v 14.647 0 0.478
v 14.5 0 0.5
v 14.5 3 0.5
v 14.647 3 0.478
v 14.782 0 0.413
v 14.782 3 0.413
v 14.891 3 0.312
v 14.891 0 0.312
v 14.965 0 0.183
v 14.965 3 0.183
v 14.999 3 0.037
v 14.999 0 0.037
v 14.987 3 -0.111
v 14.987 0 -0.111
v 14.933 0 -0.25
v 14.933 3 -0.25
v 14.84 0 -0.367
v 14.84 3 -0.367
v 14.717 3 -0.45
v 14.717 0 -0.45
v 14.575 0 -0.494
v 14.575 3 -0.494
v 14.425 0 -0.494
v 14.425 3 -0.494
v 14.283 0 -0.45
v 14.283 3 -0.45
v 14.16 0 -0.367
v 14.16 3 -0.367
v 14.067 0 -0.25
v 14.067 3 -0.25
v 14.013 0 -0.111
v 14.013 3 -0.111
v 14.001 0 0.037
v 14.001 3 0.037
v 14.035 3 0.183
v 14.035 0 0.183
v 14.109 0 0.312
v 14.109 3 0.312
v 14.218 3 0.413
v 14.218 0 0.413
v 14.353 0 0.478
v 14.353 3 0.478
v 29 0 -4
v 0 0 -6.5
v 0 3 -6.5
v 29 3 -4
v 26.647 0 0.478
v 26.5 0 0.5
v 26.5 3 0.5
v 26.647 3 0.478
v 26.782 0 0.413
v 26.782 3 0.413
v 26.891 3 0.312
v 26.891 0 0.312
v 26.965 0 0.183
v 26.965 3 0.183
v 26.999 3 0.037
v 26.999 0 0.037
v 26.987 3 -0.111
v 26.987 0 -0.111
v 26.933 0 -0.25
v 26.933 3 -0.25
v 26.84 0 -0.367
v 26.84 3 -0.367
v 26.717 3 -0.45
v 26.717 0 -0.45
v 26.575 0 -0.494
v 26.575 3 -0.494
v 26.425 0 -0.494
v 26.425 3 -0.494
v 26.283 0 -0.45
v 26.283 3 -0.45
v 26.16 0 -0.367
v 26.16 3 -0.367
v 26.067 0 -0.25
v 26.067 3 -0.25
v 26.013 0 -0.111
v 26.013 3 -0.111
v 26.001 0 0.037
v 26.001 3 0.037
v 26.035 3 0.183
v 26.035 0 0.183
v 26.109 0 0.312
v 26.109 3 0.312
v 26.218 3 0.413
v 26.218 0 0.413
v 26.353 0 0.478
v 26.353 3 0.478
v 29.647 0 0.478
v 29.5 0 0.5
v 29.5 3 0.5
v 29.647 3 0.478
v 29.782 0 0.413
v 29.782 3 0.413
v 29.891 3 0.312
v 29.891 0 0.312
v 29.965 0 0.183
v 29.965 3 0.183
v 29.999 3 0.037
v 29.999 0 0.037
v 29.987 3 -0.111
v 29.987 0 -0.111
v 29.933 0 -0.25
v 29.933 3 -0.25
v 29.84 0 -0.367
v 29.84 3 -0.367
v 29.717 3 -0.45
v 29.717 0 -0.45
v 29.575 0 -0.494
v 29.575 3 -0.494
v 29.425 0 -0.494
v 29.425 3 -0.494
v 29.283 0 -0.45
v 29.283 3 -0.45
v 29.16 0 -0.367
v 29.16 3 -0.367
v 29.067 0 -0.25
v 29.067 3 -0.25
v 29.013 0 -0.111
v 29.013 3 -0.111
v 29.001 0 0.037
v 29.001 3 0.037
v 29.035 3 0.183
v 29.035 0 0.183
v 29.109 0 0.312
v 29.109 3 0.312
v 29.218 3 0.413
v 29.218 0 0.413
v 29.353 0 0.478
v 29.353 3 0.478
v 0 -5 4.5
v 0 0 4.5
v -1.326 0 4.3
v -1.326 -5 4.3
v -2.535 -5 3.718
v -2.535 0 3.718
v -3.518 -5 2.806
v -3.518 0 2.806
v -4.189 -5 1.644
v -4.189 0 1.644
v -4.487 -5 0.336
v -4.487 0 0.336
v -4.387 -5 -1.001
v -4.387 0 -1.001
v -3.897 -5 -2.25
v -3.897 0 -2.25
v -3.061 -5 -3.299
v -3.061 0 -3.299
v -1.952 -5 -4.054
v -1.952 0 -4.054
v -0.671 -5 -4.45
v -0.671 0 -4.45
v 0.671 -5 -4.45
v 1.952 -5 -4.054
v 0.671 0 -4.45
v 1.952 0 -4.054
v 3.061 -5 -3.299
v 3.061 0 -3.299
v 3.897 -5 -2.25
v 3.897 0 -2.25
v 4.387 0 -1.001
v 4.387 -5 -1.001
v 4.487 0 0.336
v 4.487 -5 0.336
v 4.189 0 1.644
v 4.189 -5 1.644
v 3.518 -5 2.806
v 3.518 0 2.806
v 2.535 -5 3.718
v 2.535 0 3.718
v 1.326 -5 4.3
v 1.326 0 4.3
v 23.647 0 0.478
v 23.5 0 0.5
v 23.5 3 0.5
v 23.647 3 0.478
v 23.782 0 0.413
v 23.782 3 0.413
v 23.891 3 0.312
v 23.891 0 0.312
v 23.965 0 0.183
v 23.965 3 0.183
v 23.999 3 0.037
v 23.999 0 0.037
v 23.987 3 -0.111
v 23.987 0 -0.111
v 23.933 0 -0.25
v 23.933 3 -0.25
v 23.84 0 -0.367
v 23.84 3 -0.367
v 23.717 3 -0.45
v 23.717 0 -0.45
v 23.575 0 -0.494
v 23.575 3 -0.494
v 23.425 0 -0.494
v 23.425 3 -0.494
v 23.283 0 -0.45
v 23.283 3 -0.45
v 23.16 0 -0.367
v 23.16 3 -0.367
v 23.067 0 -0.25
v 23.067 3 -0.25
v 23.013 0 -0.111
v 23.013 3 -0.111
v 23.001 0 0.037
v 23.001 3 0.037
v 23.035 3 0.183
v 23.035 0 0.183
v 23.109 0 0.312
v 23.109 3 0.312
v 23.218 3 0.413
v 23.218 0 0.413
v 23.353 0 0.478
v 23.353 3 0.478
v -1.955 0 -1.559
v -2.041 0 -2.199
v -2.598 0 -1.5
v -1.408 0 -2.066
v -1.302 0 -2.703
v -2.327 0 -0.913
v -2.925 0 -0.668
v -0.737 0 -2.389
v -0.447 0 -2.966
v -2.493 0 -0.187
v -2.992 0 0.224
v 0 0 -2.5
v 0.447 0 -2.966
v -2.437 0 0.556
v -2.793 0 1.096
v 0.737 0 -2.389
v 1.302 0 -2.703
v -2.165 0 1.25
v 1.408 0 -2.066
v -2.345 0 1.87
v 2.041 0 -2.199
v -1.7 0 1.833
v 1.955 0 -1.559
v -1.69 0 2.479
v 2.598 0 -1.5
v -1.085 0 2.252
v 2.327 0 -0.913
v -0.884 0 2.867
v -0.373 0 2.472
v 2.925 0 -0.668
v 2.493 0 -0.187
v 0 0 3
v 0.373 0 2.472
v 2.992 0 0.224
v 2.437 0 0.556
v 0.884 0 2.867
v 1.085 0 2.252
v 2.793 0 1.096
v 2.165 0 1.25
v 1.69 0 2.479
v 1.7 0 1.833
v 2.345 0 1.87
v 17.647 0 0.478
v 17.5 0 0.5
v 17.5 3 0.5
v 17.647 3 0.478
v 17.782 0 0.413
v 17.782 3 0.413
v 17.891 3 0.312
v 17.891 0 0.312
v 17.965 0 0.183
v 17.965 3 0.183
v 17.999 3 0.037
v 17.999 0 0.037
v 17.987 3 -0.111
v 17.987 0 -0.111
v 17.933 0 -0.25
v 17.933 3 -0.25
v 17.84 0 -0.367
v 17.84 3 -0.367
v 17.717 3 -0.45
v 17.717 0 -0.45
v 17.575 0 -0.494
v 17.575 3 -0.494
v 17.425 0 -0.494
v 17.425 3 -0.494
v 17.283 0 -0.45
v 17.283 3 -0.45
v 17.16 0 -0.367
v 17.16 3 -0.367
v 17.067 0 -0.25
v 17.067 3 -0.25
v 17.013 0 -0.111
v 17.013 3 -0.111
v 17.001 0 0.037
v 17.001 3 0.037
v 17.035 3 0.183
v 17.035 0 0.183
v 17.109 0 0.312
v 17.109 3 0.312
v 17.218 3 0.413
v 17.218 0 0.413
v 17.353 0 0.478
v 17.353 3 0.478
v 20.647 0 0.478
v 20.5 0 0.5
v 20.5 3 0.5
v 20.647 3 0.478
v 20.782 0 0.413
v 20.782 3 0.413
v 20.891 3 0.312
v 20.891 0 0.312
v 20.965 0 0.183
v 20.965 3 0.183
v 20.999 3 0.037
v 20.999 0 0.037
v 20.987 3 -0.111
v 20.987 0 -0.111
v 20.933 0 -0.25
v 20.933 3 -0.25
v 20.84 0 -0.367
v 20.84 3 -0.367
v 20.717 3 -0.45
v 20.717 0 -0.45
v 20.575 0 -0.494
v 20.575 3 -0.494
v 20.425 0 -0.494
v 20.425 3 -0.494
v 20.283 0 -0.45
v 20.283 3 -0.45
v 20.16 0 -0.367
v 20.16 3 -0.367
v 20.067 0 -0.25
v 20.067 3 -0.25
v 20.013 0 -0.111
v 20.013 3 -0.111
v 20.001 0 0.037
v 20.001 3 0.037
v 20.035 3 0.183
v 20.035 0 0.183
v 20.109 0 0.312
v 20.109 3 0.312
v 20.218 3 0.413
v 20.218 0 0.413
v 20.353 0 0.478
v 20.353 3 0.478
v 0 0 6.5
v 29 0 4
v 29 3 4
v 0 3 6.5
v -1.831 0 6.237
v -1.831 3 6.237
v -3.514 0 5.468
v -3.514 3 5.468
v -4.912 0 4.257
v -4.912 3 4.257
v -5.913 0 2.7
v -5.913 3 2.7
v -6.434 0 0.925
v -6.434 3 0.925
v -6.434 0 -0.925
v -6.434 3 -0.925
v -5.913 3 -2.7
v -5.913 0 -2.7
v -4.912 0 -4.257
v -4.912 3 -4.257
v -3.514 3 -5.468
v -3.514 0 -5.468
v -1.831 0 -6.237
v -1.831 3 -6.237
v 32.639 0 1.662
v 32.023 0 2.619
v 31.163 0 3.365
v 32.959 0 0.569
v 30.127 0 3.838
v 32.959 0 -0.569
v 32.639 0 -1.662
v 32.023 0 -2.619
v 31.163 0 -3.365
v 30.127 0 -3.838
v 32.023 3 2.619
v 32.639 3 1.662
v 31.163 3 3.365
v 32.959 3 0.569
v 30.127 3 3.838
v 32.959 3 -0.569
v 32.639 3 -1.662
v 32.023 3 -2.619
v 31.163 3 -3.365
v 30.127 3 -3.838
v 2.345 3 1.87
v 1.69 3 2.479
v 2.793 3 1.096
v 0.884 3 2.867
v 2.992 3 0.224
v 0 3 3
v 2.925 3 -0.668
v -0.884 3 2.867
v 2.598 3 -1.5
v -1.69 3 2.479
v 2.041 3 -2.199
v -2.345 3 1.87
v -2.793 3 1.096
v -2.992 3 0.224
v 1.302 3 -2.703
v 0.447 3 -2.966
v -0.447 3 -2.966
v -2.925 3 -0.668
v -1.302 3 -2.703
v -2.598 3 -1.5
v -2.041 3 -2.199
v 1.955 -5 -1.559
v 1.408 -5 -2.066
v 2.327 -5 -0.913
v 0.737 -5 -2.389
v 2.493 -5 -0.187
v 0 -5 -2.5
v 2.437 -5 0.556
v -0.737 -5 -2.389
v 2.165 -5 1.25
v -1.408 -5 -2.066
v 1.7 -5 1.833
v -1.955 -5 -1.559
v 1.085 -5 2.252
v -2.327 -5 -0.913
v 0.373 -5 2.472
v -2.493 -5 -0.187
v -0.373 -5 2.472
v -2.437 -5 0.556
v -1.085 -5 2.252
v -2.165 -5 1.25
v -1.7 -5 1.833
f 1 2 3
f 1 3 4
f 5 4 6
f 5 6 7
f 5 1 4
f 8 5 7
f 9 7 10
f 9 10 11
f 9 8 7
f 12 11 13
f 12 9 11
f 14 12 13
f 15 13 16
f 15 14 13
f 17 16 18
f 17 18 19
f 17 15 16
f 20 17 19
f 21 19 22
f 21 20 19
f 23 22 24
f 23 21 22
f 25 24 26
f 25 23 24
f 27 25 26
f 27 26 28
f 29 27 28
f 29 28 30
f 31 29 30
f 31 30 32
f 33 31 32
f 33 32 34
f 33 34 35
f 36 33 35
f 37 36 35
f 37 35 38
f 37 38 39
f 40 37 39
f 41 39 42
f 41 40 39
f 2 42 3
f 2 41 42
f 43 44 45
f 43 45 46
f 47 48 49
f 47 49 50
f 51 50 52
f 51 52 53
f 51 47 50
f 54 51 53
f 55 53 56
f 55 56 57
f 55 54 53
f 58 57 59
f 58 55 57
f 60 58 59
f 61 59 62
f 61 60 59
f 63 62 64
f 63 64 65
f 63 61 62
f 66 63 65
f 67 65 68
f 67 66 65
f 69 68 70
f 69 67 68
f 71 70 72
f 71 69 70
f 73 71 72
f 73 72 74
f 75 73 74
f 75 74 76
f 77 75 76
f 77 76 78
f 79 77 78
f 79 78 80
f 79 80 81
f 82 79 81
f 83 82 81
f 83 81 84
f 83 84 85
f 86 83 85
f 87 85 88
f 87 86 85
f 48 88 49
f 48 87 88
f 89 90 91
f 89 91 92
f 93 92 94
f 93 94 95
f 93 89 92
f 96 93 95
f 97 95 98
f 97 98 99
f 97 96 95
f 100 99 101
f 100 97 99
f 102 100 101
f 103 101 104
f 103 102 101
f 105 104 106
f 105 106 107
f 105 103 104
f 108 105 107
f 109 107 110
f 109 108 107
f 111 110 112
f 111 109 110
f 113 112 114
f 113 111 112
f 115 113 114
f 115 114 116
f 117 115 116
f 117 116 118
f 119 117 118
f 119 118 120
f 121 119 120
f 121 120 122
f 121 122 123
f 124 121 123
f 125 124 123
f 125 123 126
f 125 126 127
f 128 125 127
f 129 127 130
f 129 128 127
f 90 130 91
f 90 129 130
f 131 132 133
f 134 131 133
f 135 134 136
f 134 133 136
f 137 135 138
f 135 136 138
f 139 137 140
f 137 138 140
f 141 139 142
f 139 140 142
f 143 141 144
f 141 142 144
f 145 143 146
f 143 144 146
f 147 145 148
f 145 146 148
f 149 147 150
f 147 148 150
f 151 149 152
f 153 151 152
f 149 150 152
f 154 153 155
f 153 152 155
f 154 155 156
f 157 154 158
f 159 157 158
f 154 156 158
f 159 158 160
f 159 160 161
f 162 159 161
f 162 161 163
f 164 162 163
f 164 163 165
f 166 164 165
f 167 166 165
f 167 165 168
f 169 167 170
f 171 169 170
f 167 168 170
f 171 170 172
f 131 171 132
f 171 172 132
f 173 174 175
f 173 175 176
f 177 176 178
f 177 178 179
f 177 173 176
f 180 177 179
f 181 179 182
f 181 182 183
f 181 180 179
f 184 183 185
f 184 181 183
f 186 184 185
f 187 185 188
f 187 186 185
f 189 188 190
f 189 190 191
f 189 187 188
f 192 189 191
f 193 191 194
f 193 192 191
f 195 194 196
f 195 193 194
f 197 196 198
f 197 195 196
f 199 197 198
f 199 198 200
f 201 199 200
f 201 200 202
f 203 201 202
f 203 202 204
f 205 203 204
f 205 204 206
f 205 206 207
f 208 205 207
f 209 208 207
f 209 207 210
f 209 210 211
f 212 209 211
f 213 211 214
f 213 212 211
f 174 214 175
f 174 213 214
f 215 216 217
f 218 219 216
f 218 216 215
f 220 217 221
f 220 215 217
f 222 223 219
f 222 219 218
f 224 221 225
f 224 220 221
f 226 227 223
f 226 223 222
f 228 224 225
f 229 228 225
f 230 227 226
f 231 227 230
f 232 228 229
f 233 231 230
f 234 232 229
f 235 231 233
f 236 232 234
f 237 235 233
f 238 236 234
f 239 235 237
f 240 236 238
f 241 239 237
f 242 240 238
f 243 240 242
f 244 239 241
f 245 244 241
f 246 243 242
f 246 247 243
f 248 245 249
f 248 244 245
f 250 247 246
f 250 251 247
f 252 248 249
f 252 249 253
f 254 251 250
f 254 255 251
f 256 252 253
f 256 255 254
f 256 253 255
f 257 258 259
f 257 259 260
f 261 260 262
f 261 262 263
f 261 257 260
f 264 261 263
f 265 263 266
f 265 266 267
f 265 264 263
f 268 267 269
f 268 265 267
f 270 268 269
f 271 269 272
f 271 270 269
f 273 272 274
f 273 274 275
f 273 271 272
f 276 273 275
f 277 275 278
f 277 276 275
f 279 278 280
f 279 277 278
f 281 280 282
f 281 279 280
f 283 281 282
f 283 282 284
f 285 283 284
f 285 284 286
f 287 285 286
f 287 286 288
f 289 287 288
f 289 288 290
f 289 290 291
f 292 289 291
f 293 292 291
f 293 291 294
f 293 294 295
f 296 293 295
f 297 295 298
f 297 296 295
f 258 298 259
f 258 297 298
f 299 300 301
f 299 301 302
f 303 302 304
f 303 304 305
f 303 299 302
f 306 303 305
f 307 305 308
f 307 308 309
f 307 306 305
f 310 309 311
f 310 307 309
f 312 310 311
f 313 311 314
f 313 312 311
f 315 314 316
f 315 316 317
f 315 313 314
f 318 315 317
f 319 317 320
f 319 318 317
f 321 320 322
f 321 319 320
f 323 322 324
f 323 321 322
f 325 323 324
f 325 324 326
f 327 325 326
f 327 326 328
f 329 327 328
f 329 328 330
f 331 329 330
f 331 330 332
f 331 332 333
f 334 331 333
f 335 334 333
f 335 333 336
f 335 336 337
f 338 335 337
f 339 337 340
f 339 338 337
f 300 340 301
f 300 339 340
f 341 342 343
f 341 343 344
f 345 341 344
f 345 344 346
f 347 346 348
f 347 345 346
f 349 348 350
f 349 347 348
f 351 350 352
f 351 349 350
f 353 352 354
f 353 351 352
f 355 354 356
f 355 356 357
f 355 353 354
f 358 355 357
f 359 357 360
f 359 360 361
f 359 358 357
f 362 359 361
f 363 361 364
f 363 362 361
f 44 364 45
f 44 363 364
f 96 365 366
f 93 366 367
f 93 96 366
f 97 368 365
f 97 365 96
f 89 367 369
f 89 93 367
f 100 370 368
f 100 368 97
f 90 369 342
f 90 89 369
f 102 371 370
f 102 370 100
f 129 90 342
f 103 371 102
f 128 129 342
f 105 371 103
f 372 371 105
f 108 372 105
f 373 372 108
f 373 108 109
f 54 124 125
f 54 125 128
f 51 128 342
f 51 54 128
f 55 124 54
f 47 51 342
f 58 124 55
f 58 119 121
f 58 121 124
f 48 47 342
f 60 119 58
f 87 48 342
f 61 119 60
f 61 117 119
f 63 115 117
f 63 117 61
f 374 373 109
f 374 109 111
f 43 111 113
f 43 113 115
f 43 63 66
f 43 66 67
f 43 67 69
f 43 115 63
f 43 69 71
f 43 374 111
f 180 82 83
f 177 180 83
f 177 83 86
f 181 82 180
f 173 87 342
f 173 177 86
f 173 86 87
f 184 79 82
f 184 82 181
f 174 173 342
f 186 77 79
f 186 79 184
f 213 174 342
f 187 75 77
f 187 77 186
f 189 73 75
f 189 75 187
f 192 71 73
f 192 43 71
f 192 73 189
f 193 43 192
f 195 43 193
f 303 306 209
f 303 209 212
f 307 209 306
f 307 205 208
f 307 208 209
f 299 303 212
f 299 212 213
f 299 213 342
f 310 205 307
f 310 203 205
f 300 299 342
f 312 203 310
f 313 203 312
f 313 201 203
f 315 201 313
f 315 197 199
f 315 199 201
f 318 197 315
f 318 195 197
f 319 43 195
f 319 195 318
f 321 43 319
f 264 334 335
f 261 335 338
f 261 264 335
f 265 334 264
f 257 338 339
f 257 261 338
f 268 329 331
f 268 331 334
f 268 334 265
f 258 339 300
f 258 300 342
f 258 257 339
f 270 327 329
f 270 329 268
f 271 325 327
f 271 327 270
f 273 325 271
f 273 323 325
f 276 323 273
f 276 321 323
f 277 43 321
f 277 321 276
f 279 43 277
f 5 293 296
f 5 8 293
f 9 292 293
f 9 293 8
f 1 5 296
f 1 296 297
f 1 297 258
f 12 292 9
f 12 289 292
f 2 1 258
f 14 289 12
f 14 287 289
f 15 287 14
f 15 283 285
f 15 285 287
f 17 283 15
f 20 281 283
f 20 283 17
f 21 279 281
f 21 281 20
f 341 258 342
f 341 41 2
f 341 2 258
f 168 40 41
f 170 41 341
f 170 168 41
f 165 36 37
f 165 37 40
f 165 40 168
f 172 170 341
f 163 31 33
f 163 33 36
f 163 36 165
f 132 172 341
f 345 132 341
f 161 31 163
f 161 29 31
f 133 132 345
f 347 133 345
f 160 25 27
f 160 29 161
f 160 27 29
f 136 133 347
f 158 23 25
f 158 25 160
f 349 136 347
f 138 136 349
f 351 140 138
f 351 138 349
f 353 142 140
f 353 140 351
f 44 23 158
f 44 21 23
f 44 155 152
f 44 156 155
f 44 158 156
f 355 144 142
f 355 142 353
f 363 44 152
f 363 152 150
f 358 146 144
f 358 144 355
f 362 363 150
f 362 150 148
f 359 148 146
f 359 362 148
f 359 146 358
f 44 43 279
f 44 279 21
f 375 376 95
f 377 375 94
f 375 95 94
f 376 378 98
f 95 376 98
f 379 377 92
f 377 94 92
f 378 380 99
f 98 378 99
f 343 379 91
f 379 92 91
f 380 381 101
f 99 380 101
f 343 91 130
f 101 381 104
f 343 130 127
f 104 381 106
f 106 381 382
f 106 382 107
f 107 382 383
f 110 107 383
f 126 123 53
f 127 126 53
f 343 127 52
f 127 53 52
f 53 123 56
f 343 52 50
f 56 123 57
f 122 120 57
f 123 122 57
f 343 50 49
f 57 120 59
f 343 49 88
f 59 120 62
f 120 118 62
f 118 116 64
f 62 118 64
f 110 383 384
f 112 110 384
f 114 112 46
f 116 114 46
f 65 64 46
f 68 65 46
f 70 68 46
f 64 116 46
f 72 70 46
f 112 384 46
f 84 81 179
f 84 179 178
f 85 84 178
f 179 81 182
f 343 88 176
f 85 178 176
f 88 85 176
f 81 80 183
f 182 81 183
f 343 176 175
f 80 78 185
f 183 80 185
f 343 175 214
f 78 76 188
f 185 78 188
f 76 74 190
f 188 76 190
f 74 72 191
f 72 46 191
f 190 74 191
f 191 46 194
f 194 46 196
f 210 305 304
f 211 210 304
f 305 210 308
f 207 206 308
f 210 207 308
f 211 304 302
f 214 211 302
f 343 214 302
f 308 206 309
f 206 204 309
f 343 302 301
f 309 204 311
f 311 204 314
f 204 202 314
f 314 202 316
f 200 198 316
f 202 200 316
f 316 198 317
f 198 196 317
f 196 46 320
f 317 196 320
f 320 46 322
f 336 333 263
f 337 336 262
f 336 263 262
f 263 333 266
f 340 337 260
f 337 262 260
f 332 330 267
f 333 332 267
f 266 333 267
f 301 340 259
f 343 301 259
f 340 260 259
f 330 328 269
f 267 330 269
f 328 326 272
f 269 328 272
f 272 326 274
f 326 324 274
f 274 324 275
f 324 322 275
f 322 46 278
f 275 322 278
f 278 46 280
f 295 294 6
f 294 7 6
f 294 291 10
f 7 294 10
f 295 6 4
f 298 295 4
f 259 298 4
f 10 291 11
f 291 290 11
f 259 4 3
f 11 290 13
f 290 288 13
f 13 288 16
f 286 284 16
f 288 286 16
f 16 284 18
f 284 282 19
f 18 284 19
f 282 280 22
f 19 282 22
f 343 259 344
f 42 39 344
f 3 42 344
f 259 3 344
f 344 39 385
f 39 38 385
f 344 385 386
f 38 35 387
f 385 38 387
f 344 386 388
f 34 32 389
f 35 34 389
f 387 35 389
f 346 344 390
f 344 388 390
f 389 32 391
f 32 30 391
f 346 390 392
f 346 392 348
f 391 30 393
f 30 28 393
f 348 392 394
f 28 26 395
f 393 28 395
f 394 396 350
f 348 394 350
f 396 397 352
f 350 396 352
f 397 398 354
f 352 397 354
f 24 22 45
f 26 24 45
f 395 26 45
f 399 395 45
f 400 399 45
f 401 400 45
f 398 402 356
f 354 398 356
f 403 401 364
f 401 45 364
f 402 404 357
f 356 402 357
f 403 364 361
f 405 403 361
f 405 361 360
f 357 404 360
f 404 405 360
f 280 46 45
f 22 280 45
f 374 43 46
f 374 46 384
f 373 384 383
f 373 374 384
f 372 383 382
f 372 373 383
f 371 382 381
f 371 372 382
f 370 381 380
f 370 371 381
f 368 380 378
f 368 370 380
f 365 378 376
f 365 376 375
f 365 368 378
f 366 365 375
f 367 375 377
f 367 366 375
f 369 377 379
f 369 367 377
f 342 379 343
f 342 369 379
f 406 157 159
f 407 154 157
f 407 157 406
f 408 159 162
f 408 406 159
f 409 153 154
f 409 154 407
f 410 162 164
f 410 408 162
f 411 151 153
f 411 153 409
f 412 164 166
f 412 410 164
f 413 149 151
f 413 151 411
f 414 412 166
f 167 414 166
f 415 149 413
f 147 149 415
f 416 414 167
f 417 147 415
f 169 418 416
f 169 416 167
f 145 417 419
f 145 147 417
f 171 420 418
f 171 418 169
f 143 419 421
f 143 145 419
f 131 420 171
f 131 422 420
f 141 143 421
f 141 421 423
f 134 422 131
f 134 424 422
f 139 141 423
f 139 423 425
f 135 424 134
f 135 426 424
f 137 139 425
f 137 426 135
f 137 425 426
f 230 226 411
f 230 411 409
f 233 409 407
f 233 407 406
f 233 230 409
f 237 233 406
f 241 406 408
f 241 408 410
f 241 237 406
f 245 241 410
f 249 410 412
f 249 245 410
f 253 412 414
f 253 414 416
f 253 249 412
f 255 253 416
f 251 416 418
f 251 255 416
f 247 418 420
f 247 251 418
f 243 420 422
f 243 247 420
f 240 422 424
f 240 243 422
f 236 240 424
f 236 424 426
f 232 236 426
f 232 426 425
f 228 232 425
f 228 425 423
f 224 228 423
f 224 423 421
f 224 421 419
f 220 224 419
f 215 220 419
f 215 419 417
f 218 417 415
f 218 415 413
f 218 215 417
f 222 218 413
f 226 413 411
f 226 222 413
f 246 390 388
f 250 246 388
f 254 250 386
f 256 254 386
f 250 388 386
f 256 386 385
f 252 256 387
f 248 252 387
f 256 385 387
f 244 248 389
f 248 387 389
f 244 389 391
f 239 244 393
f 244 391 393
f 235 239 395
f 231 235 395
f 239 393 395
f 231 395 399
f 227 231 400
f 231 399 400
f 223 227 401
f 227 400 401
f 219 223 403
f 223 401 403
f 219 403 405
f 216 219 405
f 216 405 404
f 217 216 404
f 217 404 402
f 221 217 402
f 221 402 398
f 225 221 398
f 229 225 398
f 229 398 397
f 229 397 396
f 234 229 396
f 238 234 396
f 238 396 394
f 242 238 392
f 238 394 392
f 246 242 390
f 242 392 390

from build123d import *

# Parameters (mm, degrees)
SKETCH1_R           = 0.5
BOSS_EXTRUDE1_DEPTH = 3
SKETCH3_R           = 4.5
SKETCH3_R_2         = 2.5
BOSS_EXTRUDE2_DEPTH = 5
SKETCH4_R           = 3
CUT_EXTRUDE1_DEPTH  = 3


with BuildPart() as part:
    # Sketch1 → Boss-Extrude1 (new body)
    with BuildSketch(Plane(origin=(0, 0, 0), x_dir=(1, 0, 0), z_dir=(0, 1, 0))):
        with BuildLine():
            Line((0, 6.5), (29, 4))
            ThreePointArc((29, 4), (33, 0), (29, -4))
            Line((29, -4), (0, -6.5))
            ThreePointArc((0, -6.5), (-6.5, 0), (0, 6.5))
        make_face()
        with Locations(Location((14.5, 0, 0), (0, 0, 270))):
            Circle(SKETCH1_R, mode=Mode.SUBTRACT)
        with Locations(Location((17.5, 0, 0), (0, 0, 270))):
            Circle(SKETCH1_R, mode=Mode.SUBTRACT)
        with Locations(Location((20.5, 0, 0), (0, 0, 270))):
            Circle(SKETCH1_R, mode=Mode.SUBTRACT)
        with Locations(Location((23.5, 0, 0), (0, 0, 270))):
            Circle(SKETCH1_R, mode=Mode.SUBTRACT)
        with Locations(Location((26.5, 0, 0), (0, 0, 270))):
            Circle(SKETCH1_R, mode=Mode.SUBTRACT)
        with Locations(Location((29.5, 0, 0), (0, 0, 270))):
            Circle(SKETCH1_R, mode=Mode.SUBTRACT)
    extrude(amount=BOSS_EXTRUDE1_DEPTH)

    # Sketch3 → Boss-Extrude2 (add)
    with BuildSketch(Plane.XZ):
        with Locations(Location((0, 0, 0), (0, 0, 90))):
            Circle(SKETCH3_R)
        with Locations(Location((0, 0, 0), (0, 0, 270))):
            Circle(SKETCH3_R_2, mode=Mode.SUBTRACT)
    extrude(amount=BOSS_EXTRUDE2_DEPTH)

    # Sketch4 → Cut-Extrude1 (cut)
    with BuildSketch(Plane(origin=(0, 3, 0), x_dir=(1, 0, 0), z_dir=(0, 1, 0))):
        with Locations(Location((0, 0, 0), (0, 0, 270))):
            Circle(SKETCH4_R)
    extrude(amount=-CUT_EXTRUDE1_DEPTH, mode=Mode.SUBTRACT)


solid = part.part
